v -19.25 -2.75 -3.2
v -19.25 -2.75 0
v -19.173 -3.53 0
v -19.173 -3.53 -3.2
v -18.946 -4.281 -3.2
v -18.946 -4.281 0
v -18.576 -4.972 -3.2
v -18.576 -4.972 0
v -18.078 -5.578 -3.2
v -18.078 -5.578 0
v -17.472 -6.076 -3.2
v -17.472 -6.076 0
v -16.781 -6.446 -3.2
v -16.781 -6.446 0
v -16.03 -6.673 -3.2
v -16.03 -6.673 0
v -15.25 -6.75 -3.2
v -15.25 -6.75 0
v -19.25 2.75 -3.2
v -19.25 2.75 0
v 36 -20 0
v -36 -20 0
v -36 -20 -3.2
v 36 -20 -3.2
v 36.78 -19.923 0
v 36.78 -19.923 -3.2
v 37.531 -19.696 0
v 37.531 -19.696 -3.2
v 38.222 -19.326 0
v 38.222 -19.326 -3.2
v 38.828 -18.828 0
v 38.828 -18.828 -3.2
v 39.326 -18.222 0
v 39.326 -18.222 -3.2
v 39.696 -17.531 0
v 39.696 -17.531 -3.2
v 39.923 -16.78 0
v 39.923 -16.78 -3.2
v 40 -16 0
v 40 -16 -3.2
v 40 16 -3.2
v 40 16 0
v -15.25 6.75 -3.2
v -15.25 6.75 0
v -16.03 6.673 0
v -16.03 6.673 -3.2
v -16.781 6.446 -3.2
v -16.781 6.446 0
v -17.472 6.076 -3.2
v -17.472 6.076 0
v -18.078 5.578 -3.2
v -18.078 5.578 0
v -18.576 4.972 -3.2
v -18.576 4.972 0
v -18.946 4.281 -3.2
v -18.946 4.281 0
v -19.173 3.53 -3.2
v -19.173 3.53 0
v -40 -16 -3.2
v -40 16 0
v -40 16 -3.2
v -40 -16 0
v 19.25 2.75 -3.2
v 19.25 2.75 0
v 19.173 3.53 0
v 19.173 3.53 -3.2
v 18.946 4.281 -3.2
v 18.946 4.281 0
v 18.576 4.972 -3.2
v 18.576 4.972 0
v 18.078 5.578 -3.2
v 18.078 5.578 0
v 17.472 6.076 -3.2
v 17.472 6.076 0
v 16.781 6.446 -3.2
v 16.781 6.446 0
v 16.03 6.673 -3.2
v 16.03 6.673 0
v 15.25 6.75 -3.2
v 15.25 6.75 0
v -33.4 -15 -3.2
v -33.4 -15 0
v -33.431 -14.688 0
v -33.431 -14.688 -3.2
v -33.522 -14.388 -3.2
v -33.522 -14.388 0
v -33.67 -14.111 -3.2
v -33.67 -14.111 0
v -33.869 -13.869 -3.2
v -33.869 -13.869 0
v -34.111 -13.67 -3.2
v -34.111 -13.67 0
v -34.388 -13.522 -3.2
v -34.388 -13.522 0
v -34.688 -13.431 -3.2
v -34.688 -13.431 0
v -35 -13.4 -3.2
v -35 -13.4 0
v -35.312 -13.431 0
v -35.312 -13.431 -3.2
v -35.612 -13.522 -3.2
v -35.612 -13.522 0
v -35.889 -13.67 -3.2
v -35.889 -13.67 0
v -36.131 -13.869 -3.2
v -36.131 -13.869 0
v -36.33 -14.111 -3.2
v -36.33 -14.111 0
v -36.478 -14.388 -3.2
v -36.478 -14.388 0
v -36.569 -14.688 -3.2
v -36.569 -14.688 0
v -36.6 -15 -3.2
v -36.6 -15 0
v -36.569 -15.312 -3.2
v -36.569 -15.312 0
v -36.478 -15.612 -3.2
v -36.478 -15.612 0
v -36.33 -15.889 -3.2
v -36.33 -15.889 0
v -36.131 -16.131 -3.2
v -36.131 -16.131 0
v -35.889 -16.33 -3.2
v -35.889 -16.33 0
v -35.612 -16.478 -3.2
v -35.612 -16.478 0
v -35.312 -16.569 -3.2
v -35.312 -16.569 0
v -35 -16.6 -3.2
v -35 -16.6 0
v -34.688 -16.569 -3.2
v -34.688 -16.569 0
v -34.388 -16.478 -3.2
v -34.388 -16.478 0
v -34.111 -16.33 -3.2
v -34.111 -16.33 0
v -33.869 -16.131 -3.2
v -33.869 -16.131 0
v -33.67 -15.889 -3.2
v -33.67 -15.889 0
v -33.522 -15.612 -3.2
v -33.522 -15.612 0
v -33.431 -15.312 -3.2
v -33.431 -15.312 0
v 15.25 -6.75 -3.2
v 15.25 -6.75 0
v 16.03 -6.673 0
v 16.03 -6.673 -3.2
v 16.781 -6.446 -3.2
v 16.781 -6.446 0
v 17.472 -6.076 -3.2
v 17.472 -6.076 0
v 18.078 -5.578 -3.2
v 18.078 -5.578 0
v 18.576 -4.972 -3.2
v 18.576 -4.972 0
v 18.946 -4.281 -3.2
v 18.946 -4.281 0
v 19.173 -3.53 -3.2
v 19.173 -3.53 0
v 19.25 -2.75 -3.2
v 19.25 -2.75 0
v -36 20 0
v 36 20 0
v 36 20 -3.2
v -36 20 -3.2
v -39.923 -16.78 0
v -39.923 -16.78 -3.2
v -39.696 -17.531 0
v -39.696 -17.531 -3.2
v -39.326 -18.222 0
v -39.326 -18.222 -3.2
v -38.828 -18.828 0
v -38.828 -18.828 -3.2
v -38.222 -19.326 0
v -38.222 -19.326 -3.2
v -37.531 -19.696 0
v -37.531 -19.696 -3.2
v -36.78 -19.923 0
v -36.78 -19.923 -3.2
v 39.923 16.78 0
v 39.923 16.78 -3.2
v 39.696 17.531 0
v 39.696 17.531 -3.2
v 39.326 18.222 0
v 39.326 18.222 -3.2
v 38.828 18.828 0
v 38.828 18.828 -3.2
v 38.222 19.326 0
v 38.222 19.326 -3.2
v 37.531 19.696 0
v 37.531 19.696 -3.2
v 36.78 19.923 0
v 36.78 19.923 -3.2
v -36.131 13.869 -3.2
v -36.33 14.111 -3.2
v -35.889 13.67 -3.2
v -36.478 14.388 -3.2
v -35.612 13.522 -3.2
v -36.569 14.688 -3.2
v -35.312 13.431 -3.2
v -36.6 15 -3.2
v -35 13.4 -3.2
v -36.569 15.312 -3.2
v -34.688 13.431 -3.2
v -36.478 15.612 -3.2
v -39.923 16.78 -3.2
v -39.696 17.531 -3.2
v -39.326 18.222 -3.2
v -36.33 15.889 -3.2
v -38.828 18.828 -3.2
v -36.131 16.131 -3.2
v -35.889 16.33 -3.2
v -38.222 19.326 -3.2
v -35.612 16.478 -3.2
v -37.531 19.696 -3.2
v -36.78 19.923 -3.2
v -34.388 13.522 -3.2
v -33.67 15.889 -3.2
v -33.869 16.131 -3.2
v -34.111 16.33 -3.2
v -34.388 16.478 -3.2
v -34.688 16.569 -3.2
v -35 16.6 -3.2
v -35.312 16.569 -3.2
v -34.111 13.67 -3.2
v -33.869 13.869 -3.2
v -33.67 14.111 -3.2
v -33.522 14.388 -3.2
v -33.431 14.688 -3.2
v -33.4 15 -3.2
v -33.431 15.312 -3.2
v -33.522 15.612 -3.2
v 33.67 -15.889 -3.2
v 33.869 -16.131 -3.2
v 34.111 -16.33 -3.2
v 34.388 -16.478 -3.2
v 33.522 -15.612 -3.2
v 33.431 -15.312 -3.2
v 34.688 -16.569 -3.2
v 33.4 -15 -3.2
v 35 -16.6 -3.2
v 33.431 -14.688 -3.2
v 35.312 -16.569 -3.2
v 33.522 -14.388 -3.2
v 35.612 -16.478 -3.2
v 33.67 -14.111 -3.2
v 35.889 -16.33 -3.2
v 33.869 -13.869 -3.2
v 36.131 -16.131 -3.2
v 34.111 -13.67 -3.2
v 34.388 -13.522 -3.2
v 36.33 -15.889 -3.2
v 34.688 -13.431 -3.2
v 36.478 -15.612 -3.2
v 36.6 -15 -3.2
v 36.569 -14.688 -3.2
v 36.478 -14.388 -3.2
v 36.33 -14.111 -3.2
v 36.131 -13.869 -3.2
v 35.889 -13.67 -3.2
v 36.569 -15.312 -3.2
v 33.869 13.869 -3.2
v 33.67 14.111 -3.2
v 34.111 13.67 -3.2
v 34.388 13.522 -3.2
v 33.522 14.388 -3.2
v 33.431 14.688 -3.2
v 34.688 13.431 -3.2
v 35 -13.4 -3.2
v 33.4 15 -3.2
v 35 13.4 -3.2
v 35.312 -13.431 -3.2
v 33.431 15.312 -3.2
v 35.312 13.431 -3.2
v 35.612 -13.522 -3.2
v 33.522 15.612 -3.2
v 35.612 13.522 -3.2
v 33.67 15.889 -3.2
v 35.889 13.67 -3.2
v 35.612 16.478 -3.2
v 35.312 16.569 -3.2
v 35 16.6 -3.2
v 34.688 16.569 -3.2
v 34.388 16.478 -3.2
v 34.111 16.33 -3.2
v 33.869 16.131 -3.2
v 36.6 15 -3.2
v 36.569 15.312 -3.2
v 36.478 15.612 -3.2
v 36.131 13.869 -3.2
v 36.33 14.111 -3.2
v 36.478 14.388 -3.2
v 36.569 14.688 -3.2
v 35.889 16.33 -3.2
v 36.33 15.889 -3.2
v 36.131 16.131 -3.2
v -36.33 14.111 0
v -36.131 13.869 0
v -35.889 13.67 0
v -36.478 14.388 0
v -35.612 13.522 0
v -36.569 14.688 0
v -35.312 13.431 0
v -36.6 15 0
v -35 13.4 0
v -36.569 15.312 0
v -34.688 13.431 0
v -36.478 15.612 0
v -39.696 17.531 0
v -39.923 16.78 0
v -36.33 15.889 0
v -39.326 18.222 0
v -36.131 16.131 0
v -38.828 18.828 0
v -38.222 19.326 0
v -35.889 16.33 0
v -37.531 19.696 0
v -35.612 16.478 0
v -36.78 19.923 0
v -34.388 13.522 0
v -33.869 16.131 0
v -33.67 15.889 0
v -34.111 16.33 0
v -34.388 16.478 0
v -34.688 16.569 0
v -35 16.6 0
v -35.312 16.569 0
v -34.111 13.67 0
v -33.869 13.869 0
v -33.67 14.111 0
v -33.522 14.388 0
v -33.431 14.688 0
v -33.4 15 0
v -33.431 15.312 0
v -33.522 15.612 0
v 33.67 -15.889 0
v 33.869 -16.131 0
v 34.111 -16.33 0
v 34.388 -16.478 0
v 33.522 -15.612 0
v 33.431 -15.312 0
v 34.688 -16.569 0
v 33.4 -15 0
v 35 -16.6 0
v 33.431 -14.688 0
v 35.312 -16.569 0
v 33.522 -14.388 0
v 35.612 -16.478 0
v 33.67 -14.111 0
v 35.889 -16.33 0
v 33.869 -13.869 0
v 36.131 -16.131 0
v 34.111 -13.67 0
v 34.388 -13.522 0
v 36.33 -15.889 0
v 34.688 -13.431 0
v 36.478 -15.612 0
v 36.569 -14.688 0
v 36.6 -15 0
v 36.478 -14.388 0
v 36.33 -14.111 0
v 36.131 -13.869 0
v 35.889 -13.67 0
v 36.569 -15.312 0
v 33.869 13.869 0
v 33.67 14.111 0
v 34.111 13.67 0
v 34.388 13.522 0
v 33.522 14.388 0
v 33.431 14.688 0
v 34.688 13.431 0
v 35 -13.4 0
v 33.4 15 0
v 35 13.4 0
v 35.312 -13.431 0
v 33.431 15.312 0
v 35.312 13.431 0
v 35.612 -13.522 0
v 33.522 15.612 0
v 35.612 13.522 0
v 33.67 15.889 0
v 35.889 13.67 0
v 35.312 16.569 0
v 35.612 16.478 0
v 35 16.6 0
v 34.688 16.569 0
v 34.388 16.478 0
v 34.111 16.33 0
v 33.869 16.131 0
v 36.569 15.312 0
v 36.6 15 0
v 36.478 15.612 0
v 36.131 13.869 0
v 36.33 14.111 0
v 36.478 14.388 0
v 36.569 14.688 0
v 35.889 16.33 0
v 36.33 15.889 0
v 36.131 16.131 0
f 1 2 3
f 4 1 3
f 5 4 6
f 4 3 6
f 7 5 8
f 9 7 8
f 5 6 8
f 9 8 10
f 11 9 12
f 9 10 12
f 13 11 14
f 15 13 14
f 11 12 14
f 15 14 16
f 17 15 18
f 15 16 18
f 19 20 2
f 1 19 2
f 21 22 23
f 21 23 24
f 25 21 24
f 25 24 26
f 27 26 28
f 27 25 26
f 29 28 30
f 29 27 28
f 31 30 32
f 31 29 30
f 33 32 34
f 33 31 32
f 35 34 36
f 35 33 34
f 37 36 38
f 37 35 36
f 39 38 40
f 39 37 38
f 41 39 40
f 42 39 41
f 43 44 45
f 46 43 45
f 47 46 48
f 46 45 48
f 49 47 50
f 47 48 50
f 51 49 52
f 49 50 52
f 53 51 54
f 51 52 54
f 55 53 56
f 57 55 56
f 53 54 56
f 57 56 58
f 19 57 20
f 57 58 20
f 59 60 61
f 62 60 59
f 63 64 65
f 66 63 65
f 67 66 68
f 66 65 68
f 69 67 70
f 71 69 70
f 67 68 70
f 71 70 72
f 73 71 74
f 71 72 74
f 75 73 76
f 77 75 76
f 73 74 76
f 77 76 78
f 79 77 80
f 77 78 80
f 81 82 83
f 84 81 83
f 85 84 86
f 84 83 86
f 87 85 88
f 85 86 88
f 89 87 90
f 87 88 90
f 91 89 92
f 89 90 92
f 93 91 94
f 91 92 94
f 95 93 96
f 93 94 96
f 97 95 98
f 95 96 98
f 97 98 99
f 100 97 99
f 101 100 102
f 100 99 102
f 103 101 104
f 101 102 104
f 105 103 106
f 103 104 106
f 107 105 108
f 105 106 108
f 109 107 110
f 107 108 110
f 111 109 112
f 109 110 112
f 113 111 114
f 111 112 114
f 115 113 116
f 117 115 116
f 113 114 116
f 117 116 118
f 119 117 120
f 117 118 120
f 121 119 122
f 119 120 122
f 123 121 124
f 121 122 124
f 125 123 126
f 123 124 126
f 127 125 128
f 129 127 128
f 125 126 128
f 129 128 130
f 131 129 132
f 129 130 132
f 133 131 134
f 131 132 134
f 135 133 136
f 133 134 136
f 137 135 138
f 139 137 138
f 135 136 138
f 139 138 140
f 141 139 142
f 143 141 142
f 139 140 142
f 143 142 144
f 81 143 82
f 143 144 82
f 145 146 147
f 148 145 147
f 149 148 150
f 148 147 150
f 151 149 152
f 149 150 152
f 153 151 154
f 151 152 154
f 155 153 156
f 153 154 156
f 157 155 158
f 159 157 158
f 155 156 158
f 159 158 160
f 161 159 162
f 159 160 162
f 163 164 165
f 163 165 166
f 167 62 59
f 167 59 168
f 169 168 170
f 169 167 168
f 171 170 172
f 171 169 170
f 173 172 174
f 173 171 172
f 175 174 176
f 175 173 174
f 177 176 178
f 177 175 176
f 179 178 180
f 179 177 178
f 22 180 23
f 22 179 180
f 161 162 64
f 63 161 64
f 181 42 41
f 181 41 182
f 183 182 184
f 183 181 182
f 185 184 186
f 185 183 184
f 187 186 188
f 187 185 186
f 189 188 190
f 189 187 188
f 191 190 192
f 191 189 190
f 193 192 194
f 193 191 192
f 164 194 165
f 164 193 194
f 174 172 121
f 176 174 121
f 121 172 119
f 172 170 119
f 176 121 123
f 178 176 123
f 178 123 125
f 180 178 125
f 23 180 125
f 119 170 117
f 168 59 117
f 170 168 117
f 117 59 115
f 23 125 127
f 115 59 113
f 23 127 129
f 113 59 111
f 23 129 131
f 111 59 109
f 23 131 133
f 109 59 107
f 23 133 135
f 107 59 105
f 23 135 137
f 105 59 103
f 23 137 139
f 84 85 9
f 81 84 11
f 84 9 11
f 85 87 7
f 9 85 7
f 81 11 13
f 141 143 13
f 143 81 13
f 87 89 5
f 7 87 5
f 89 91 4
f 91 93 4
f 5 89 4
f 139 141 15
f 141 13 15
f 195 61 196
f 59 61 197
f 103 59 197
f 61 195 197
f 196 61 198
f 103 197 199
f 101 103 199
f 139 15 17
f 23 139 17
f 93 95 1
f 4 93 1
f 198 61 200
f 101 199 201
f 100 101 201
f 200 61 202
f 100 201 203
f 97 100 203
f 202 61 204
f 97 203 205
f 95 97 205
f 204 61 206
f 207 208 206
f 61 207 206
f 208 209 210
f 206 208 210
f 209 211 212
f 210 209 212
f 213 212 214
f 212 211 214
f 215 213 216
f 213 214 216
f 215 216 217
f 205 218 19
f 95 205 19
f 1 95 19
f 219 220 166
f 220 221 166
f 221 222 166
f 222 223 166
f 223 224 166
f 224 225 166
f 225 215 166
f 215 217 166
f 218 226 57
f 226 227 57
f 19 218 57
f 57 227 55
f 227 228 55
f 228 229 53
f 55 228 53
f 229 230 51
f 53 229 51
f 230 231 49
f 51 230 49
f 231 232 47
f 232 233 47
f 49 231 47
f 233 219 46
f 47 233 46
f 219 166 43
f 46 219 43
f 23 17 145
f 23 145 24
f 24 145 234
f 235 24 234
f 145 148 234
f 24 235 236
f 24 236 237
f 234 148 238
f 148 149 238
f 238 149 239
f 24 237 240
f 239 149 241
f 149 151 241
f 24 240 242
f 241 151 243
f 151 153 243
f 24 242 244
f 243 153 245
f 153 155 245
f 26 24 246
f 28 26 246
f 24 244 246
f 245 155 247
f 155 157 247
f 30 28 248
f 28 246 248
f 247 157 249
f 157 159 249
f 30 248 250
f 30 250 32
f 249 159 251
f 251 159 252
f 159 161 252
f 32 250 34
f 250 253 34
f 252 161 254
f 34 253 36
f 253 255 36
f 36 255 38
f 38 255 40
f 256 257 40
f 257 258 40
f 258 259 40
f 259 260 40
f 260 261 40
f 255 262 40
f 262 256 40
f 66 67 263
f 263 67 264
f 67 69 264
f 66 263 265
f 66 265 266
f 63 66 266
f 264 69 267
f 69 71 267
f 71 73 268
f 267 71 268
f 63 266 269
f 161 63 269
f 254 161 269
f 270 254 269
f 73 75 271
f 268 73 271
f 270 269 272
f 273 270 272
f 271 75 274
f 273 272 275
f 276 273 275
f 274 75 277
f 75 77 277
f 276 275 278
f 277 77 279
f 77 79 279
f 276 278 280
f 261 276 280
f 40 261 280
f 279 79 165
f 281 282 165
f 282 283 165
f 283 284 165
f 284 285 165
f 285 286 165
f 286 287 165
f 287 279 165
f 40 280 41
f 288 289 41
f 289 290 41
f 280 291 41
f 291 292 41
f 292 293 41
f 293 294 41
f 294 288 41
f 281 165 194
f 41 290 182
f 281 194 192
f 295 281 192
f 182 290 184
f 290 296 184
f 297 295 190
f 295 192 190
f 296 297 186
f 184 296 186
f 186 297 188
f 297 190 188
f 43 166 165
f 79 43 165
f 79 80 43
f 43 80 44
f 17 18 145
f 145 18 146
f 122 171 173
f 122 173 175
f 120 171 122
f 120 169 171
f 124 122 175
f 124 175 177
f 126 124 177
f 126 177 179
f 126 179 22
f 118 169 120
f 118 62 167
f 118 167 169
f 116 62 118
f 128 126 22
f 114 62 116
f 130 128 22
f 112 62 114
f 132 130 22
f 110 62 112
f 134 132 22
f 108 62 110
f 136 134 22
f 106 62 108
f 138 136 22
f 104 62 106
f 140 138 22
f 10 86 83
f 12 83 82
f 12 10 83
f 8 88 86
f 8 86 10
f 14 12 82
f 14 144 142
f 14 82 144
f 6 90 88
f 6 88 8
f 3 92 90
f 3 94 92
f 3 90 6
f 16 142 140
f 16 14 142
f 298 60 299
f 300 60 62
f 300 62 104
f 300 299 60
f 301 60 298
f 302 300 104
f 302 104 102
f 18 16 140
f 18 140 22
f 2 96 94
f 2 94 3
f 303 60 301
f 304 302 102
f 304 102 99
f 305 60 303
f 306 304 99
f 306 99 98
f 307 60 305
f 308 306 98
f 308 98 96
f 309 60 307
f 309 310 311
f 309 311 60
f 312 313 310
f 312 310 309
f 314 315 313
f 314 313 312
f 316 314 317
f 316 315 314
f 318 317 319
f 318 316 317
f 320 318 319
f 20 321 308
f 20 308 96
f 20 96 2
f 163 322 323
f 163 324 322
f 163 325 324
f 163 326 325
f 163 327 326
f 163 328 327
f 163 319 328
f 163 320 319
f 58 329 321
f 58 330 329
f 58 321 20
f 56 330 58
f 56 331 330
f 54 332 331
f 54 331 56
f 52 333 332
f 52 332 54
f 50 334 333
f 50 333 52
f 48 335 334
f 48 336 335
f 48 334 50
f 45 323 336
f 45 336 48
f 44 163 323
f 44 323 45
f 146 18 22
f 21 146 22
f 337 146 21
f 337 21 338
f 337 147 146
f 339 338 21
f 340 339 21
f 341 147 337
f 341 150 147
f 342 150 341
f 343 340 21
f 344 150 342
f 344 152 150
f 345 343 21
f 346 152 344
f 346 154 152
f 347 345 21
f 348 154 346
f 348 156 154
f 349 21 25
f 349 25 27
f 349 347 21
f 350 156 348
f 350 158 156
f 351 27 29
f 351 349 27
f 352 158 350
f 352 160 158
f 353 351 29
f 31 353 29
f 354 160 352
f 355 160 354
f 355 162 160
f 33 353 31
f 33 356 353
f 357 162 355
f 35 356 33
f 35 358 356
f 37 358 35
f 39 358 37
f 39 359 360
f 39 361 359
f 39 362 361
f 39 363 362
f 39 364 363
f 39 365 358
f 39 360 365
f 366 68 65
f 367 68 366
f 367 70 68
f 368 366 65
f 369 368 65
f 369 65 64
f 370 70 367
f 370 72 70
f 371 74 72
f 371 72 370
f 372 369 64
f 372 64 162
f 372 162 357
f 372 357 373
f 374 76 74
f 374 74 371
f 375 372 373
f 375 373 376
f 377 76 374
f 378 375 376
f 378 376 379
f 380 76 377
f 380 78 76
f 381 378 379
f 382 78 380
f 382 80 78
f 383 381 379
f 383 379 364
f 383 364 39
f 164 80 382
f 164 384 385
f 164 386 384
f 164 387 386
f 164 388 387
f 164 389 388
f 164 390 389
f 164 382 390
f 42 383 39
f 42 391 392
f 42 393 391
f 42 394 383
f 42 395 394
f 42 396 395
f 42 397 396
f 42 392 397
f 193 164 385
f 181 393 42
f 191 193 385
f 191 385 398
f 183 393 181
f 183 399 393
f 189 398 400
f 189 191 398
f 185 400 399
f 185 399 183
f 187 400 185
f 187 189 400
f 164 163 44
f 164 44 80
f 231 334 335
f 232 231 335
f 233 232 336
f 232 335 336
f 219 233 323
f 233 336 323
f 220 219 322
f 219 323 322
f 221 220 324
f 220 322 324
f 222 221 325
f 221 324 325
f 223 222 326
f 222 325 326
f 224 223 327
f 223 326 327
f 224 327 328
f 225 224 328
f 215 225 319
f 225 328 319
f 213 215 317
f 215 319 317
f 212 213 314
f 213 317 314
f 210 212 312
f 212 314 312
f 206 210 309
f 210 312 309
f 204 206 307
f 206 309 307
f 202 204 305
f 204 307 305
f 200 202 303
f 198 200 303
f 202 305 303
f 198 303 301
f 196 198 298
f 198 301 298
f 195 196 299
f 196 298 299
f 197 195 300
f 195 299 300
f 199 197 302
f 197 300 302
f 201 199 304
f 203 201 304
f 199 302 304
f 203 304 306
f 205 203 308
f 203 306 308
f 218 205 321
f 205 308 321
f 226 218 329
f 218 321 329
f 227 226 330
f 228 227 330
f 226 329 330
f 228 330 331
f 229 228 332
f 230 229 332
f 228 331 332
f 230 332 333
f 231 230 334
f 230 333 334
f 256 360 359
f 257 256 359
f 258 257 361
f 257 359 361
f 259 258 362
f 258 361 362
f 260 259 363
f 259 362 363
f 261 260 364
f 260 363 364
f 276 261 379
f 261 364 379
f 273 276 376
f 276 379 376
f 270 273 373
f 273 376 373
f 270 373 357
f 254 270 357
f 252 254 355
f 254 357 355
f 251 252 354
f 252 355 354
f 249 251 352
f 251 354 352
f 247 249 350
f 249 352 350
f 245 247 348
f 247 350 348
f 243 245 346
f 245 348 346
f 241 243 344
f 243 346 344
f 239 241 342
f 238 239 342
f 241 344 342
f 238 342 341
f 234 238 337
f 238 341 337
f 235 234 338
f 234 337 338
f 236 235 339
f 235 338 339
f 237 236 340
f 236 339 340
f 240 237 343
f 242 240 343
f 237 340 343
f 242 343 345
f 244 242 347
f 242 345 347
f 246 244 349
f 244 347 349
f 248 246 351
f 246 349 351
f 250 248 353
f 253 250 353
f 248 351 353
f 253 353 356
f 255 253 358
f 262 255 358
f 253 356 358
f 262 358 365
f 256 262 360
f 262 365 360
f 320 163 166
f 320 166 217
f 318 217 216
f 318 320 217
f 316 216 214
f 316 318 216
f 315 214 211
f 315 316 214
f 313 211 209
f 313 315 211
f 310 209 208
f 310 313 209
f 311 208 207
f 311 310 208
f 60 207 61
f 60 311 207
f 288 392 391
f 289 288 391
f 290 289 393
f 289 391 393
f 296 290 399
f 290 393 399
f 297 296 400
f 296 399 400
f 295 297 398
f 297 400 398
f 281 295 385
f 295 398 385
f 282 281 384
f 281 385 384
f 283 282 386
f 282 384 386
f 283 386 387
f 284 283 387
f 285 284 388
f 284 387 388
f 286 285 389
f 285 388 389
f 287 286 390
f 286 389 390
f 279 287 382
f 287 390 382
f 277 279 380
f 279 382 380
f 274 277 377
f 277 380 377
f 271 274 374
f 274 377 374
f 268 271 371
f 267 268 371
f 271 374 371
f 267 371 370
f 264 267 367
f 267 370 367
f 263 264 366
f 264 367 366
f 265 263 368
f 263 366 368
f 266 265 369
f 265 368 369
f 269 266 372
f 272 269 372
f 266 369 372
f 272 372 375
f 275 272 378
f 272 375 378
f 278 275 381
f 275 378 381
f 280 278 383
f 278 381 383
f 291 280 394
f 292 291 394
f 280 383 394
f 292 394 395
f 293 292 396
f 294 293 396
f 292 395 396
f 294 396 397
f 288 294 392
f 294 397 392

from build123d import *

# Parameters (mm, degrees)
EXTRUDE_1_DEPTH     = 3.2
CUT_EXTRUDE_1_DEPTH = 3.2
SKETCH_3_R          = 1.6
CUT_EXTRUDE_2_DEPTH = 3.2


with BuildPart() as part:
    # 草图1 → 凸台-拉伸1 (new body)
    with BuildSketch(Plane.XY):
        with BuildLine():
            Line((-36, -20), (36, -20))
            ThreePointArc((36, -20), (38.828427125, -18.828427125), (40, -16))
            Line((40, -16), (40, 16))
            ThreePointArc((40, 16), (38.828427125, 18.828427125), (36, 20))
            Line((36, 20), (-36, 20))
            ThreePointArc((-36, 20), (-38.828427125, 18.828427125), (-40, 16))
            Line((-40, 16), (-40, -16))
            ThreePointArc((-40, -16), (-38.828427125, -18.828427125), (-36, -20))
        make_face()
    extrude(amount=-EXTRUDE_1_DEPTH)

    # 草图2 → 切除-拉伸1 (cut)
    with BuildSketch(Plane.XY):
        with BuildLine():
            Line((-15.25, -6.75), (15.25, -6.75))
            ThreePointArc((15.25, -6.75), (18.078427125, -5.578427125), (19.25, -2.75))
            Line((19.25, -2.75), (19.25, 2.75))
            ThreePointArc((19.25, 2.75), (18.078427125, 5.578427125), (15.25, 6.75))
            Line((15.25, 6.75), (-15.25, 6.75))
            ThreePointArc((-15.25, 6.75), (-18.078427125, 5.578427125), (-19.25, 2.75))
            Line((-19.25, 2.75), (-19.25, -2.75))
            ThreePointArc((-19.25, -2.75), (-18.078427125, -5.578427125), (-15.25, -6.75))
        make_face()
    extrude(amount=-CUT_EXTRUDE_1_DEPTH, mode=Mode.SUBTRACT)

    # 草图3 → 切除-拉伸2 (cut)
    with BuildSketch(Plane.XY):
        with Locations((-35, 15)):
            Circle(SKETCH_3_R)
        with Locations((35, 15)):
            Circle(SKETCH_3_R)
        with Locations((35, -15)):
            Circle(SKETCH_3_R)
        with Locations((-35, -15)):
            Circle(SKETCH_3_R)
    extrude(amount=-CUT_EXTRUDE_2_DEPTH, mode=Mode.SUBTRACT)


solid = part.part
